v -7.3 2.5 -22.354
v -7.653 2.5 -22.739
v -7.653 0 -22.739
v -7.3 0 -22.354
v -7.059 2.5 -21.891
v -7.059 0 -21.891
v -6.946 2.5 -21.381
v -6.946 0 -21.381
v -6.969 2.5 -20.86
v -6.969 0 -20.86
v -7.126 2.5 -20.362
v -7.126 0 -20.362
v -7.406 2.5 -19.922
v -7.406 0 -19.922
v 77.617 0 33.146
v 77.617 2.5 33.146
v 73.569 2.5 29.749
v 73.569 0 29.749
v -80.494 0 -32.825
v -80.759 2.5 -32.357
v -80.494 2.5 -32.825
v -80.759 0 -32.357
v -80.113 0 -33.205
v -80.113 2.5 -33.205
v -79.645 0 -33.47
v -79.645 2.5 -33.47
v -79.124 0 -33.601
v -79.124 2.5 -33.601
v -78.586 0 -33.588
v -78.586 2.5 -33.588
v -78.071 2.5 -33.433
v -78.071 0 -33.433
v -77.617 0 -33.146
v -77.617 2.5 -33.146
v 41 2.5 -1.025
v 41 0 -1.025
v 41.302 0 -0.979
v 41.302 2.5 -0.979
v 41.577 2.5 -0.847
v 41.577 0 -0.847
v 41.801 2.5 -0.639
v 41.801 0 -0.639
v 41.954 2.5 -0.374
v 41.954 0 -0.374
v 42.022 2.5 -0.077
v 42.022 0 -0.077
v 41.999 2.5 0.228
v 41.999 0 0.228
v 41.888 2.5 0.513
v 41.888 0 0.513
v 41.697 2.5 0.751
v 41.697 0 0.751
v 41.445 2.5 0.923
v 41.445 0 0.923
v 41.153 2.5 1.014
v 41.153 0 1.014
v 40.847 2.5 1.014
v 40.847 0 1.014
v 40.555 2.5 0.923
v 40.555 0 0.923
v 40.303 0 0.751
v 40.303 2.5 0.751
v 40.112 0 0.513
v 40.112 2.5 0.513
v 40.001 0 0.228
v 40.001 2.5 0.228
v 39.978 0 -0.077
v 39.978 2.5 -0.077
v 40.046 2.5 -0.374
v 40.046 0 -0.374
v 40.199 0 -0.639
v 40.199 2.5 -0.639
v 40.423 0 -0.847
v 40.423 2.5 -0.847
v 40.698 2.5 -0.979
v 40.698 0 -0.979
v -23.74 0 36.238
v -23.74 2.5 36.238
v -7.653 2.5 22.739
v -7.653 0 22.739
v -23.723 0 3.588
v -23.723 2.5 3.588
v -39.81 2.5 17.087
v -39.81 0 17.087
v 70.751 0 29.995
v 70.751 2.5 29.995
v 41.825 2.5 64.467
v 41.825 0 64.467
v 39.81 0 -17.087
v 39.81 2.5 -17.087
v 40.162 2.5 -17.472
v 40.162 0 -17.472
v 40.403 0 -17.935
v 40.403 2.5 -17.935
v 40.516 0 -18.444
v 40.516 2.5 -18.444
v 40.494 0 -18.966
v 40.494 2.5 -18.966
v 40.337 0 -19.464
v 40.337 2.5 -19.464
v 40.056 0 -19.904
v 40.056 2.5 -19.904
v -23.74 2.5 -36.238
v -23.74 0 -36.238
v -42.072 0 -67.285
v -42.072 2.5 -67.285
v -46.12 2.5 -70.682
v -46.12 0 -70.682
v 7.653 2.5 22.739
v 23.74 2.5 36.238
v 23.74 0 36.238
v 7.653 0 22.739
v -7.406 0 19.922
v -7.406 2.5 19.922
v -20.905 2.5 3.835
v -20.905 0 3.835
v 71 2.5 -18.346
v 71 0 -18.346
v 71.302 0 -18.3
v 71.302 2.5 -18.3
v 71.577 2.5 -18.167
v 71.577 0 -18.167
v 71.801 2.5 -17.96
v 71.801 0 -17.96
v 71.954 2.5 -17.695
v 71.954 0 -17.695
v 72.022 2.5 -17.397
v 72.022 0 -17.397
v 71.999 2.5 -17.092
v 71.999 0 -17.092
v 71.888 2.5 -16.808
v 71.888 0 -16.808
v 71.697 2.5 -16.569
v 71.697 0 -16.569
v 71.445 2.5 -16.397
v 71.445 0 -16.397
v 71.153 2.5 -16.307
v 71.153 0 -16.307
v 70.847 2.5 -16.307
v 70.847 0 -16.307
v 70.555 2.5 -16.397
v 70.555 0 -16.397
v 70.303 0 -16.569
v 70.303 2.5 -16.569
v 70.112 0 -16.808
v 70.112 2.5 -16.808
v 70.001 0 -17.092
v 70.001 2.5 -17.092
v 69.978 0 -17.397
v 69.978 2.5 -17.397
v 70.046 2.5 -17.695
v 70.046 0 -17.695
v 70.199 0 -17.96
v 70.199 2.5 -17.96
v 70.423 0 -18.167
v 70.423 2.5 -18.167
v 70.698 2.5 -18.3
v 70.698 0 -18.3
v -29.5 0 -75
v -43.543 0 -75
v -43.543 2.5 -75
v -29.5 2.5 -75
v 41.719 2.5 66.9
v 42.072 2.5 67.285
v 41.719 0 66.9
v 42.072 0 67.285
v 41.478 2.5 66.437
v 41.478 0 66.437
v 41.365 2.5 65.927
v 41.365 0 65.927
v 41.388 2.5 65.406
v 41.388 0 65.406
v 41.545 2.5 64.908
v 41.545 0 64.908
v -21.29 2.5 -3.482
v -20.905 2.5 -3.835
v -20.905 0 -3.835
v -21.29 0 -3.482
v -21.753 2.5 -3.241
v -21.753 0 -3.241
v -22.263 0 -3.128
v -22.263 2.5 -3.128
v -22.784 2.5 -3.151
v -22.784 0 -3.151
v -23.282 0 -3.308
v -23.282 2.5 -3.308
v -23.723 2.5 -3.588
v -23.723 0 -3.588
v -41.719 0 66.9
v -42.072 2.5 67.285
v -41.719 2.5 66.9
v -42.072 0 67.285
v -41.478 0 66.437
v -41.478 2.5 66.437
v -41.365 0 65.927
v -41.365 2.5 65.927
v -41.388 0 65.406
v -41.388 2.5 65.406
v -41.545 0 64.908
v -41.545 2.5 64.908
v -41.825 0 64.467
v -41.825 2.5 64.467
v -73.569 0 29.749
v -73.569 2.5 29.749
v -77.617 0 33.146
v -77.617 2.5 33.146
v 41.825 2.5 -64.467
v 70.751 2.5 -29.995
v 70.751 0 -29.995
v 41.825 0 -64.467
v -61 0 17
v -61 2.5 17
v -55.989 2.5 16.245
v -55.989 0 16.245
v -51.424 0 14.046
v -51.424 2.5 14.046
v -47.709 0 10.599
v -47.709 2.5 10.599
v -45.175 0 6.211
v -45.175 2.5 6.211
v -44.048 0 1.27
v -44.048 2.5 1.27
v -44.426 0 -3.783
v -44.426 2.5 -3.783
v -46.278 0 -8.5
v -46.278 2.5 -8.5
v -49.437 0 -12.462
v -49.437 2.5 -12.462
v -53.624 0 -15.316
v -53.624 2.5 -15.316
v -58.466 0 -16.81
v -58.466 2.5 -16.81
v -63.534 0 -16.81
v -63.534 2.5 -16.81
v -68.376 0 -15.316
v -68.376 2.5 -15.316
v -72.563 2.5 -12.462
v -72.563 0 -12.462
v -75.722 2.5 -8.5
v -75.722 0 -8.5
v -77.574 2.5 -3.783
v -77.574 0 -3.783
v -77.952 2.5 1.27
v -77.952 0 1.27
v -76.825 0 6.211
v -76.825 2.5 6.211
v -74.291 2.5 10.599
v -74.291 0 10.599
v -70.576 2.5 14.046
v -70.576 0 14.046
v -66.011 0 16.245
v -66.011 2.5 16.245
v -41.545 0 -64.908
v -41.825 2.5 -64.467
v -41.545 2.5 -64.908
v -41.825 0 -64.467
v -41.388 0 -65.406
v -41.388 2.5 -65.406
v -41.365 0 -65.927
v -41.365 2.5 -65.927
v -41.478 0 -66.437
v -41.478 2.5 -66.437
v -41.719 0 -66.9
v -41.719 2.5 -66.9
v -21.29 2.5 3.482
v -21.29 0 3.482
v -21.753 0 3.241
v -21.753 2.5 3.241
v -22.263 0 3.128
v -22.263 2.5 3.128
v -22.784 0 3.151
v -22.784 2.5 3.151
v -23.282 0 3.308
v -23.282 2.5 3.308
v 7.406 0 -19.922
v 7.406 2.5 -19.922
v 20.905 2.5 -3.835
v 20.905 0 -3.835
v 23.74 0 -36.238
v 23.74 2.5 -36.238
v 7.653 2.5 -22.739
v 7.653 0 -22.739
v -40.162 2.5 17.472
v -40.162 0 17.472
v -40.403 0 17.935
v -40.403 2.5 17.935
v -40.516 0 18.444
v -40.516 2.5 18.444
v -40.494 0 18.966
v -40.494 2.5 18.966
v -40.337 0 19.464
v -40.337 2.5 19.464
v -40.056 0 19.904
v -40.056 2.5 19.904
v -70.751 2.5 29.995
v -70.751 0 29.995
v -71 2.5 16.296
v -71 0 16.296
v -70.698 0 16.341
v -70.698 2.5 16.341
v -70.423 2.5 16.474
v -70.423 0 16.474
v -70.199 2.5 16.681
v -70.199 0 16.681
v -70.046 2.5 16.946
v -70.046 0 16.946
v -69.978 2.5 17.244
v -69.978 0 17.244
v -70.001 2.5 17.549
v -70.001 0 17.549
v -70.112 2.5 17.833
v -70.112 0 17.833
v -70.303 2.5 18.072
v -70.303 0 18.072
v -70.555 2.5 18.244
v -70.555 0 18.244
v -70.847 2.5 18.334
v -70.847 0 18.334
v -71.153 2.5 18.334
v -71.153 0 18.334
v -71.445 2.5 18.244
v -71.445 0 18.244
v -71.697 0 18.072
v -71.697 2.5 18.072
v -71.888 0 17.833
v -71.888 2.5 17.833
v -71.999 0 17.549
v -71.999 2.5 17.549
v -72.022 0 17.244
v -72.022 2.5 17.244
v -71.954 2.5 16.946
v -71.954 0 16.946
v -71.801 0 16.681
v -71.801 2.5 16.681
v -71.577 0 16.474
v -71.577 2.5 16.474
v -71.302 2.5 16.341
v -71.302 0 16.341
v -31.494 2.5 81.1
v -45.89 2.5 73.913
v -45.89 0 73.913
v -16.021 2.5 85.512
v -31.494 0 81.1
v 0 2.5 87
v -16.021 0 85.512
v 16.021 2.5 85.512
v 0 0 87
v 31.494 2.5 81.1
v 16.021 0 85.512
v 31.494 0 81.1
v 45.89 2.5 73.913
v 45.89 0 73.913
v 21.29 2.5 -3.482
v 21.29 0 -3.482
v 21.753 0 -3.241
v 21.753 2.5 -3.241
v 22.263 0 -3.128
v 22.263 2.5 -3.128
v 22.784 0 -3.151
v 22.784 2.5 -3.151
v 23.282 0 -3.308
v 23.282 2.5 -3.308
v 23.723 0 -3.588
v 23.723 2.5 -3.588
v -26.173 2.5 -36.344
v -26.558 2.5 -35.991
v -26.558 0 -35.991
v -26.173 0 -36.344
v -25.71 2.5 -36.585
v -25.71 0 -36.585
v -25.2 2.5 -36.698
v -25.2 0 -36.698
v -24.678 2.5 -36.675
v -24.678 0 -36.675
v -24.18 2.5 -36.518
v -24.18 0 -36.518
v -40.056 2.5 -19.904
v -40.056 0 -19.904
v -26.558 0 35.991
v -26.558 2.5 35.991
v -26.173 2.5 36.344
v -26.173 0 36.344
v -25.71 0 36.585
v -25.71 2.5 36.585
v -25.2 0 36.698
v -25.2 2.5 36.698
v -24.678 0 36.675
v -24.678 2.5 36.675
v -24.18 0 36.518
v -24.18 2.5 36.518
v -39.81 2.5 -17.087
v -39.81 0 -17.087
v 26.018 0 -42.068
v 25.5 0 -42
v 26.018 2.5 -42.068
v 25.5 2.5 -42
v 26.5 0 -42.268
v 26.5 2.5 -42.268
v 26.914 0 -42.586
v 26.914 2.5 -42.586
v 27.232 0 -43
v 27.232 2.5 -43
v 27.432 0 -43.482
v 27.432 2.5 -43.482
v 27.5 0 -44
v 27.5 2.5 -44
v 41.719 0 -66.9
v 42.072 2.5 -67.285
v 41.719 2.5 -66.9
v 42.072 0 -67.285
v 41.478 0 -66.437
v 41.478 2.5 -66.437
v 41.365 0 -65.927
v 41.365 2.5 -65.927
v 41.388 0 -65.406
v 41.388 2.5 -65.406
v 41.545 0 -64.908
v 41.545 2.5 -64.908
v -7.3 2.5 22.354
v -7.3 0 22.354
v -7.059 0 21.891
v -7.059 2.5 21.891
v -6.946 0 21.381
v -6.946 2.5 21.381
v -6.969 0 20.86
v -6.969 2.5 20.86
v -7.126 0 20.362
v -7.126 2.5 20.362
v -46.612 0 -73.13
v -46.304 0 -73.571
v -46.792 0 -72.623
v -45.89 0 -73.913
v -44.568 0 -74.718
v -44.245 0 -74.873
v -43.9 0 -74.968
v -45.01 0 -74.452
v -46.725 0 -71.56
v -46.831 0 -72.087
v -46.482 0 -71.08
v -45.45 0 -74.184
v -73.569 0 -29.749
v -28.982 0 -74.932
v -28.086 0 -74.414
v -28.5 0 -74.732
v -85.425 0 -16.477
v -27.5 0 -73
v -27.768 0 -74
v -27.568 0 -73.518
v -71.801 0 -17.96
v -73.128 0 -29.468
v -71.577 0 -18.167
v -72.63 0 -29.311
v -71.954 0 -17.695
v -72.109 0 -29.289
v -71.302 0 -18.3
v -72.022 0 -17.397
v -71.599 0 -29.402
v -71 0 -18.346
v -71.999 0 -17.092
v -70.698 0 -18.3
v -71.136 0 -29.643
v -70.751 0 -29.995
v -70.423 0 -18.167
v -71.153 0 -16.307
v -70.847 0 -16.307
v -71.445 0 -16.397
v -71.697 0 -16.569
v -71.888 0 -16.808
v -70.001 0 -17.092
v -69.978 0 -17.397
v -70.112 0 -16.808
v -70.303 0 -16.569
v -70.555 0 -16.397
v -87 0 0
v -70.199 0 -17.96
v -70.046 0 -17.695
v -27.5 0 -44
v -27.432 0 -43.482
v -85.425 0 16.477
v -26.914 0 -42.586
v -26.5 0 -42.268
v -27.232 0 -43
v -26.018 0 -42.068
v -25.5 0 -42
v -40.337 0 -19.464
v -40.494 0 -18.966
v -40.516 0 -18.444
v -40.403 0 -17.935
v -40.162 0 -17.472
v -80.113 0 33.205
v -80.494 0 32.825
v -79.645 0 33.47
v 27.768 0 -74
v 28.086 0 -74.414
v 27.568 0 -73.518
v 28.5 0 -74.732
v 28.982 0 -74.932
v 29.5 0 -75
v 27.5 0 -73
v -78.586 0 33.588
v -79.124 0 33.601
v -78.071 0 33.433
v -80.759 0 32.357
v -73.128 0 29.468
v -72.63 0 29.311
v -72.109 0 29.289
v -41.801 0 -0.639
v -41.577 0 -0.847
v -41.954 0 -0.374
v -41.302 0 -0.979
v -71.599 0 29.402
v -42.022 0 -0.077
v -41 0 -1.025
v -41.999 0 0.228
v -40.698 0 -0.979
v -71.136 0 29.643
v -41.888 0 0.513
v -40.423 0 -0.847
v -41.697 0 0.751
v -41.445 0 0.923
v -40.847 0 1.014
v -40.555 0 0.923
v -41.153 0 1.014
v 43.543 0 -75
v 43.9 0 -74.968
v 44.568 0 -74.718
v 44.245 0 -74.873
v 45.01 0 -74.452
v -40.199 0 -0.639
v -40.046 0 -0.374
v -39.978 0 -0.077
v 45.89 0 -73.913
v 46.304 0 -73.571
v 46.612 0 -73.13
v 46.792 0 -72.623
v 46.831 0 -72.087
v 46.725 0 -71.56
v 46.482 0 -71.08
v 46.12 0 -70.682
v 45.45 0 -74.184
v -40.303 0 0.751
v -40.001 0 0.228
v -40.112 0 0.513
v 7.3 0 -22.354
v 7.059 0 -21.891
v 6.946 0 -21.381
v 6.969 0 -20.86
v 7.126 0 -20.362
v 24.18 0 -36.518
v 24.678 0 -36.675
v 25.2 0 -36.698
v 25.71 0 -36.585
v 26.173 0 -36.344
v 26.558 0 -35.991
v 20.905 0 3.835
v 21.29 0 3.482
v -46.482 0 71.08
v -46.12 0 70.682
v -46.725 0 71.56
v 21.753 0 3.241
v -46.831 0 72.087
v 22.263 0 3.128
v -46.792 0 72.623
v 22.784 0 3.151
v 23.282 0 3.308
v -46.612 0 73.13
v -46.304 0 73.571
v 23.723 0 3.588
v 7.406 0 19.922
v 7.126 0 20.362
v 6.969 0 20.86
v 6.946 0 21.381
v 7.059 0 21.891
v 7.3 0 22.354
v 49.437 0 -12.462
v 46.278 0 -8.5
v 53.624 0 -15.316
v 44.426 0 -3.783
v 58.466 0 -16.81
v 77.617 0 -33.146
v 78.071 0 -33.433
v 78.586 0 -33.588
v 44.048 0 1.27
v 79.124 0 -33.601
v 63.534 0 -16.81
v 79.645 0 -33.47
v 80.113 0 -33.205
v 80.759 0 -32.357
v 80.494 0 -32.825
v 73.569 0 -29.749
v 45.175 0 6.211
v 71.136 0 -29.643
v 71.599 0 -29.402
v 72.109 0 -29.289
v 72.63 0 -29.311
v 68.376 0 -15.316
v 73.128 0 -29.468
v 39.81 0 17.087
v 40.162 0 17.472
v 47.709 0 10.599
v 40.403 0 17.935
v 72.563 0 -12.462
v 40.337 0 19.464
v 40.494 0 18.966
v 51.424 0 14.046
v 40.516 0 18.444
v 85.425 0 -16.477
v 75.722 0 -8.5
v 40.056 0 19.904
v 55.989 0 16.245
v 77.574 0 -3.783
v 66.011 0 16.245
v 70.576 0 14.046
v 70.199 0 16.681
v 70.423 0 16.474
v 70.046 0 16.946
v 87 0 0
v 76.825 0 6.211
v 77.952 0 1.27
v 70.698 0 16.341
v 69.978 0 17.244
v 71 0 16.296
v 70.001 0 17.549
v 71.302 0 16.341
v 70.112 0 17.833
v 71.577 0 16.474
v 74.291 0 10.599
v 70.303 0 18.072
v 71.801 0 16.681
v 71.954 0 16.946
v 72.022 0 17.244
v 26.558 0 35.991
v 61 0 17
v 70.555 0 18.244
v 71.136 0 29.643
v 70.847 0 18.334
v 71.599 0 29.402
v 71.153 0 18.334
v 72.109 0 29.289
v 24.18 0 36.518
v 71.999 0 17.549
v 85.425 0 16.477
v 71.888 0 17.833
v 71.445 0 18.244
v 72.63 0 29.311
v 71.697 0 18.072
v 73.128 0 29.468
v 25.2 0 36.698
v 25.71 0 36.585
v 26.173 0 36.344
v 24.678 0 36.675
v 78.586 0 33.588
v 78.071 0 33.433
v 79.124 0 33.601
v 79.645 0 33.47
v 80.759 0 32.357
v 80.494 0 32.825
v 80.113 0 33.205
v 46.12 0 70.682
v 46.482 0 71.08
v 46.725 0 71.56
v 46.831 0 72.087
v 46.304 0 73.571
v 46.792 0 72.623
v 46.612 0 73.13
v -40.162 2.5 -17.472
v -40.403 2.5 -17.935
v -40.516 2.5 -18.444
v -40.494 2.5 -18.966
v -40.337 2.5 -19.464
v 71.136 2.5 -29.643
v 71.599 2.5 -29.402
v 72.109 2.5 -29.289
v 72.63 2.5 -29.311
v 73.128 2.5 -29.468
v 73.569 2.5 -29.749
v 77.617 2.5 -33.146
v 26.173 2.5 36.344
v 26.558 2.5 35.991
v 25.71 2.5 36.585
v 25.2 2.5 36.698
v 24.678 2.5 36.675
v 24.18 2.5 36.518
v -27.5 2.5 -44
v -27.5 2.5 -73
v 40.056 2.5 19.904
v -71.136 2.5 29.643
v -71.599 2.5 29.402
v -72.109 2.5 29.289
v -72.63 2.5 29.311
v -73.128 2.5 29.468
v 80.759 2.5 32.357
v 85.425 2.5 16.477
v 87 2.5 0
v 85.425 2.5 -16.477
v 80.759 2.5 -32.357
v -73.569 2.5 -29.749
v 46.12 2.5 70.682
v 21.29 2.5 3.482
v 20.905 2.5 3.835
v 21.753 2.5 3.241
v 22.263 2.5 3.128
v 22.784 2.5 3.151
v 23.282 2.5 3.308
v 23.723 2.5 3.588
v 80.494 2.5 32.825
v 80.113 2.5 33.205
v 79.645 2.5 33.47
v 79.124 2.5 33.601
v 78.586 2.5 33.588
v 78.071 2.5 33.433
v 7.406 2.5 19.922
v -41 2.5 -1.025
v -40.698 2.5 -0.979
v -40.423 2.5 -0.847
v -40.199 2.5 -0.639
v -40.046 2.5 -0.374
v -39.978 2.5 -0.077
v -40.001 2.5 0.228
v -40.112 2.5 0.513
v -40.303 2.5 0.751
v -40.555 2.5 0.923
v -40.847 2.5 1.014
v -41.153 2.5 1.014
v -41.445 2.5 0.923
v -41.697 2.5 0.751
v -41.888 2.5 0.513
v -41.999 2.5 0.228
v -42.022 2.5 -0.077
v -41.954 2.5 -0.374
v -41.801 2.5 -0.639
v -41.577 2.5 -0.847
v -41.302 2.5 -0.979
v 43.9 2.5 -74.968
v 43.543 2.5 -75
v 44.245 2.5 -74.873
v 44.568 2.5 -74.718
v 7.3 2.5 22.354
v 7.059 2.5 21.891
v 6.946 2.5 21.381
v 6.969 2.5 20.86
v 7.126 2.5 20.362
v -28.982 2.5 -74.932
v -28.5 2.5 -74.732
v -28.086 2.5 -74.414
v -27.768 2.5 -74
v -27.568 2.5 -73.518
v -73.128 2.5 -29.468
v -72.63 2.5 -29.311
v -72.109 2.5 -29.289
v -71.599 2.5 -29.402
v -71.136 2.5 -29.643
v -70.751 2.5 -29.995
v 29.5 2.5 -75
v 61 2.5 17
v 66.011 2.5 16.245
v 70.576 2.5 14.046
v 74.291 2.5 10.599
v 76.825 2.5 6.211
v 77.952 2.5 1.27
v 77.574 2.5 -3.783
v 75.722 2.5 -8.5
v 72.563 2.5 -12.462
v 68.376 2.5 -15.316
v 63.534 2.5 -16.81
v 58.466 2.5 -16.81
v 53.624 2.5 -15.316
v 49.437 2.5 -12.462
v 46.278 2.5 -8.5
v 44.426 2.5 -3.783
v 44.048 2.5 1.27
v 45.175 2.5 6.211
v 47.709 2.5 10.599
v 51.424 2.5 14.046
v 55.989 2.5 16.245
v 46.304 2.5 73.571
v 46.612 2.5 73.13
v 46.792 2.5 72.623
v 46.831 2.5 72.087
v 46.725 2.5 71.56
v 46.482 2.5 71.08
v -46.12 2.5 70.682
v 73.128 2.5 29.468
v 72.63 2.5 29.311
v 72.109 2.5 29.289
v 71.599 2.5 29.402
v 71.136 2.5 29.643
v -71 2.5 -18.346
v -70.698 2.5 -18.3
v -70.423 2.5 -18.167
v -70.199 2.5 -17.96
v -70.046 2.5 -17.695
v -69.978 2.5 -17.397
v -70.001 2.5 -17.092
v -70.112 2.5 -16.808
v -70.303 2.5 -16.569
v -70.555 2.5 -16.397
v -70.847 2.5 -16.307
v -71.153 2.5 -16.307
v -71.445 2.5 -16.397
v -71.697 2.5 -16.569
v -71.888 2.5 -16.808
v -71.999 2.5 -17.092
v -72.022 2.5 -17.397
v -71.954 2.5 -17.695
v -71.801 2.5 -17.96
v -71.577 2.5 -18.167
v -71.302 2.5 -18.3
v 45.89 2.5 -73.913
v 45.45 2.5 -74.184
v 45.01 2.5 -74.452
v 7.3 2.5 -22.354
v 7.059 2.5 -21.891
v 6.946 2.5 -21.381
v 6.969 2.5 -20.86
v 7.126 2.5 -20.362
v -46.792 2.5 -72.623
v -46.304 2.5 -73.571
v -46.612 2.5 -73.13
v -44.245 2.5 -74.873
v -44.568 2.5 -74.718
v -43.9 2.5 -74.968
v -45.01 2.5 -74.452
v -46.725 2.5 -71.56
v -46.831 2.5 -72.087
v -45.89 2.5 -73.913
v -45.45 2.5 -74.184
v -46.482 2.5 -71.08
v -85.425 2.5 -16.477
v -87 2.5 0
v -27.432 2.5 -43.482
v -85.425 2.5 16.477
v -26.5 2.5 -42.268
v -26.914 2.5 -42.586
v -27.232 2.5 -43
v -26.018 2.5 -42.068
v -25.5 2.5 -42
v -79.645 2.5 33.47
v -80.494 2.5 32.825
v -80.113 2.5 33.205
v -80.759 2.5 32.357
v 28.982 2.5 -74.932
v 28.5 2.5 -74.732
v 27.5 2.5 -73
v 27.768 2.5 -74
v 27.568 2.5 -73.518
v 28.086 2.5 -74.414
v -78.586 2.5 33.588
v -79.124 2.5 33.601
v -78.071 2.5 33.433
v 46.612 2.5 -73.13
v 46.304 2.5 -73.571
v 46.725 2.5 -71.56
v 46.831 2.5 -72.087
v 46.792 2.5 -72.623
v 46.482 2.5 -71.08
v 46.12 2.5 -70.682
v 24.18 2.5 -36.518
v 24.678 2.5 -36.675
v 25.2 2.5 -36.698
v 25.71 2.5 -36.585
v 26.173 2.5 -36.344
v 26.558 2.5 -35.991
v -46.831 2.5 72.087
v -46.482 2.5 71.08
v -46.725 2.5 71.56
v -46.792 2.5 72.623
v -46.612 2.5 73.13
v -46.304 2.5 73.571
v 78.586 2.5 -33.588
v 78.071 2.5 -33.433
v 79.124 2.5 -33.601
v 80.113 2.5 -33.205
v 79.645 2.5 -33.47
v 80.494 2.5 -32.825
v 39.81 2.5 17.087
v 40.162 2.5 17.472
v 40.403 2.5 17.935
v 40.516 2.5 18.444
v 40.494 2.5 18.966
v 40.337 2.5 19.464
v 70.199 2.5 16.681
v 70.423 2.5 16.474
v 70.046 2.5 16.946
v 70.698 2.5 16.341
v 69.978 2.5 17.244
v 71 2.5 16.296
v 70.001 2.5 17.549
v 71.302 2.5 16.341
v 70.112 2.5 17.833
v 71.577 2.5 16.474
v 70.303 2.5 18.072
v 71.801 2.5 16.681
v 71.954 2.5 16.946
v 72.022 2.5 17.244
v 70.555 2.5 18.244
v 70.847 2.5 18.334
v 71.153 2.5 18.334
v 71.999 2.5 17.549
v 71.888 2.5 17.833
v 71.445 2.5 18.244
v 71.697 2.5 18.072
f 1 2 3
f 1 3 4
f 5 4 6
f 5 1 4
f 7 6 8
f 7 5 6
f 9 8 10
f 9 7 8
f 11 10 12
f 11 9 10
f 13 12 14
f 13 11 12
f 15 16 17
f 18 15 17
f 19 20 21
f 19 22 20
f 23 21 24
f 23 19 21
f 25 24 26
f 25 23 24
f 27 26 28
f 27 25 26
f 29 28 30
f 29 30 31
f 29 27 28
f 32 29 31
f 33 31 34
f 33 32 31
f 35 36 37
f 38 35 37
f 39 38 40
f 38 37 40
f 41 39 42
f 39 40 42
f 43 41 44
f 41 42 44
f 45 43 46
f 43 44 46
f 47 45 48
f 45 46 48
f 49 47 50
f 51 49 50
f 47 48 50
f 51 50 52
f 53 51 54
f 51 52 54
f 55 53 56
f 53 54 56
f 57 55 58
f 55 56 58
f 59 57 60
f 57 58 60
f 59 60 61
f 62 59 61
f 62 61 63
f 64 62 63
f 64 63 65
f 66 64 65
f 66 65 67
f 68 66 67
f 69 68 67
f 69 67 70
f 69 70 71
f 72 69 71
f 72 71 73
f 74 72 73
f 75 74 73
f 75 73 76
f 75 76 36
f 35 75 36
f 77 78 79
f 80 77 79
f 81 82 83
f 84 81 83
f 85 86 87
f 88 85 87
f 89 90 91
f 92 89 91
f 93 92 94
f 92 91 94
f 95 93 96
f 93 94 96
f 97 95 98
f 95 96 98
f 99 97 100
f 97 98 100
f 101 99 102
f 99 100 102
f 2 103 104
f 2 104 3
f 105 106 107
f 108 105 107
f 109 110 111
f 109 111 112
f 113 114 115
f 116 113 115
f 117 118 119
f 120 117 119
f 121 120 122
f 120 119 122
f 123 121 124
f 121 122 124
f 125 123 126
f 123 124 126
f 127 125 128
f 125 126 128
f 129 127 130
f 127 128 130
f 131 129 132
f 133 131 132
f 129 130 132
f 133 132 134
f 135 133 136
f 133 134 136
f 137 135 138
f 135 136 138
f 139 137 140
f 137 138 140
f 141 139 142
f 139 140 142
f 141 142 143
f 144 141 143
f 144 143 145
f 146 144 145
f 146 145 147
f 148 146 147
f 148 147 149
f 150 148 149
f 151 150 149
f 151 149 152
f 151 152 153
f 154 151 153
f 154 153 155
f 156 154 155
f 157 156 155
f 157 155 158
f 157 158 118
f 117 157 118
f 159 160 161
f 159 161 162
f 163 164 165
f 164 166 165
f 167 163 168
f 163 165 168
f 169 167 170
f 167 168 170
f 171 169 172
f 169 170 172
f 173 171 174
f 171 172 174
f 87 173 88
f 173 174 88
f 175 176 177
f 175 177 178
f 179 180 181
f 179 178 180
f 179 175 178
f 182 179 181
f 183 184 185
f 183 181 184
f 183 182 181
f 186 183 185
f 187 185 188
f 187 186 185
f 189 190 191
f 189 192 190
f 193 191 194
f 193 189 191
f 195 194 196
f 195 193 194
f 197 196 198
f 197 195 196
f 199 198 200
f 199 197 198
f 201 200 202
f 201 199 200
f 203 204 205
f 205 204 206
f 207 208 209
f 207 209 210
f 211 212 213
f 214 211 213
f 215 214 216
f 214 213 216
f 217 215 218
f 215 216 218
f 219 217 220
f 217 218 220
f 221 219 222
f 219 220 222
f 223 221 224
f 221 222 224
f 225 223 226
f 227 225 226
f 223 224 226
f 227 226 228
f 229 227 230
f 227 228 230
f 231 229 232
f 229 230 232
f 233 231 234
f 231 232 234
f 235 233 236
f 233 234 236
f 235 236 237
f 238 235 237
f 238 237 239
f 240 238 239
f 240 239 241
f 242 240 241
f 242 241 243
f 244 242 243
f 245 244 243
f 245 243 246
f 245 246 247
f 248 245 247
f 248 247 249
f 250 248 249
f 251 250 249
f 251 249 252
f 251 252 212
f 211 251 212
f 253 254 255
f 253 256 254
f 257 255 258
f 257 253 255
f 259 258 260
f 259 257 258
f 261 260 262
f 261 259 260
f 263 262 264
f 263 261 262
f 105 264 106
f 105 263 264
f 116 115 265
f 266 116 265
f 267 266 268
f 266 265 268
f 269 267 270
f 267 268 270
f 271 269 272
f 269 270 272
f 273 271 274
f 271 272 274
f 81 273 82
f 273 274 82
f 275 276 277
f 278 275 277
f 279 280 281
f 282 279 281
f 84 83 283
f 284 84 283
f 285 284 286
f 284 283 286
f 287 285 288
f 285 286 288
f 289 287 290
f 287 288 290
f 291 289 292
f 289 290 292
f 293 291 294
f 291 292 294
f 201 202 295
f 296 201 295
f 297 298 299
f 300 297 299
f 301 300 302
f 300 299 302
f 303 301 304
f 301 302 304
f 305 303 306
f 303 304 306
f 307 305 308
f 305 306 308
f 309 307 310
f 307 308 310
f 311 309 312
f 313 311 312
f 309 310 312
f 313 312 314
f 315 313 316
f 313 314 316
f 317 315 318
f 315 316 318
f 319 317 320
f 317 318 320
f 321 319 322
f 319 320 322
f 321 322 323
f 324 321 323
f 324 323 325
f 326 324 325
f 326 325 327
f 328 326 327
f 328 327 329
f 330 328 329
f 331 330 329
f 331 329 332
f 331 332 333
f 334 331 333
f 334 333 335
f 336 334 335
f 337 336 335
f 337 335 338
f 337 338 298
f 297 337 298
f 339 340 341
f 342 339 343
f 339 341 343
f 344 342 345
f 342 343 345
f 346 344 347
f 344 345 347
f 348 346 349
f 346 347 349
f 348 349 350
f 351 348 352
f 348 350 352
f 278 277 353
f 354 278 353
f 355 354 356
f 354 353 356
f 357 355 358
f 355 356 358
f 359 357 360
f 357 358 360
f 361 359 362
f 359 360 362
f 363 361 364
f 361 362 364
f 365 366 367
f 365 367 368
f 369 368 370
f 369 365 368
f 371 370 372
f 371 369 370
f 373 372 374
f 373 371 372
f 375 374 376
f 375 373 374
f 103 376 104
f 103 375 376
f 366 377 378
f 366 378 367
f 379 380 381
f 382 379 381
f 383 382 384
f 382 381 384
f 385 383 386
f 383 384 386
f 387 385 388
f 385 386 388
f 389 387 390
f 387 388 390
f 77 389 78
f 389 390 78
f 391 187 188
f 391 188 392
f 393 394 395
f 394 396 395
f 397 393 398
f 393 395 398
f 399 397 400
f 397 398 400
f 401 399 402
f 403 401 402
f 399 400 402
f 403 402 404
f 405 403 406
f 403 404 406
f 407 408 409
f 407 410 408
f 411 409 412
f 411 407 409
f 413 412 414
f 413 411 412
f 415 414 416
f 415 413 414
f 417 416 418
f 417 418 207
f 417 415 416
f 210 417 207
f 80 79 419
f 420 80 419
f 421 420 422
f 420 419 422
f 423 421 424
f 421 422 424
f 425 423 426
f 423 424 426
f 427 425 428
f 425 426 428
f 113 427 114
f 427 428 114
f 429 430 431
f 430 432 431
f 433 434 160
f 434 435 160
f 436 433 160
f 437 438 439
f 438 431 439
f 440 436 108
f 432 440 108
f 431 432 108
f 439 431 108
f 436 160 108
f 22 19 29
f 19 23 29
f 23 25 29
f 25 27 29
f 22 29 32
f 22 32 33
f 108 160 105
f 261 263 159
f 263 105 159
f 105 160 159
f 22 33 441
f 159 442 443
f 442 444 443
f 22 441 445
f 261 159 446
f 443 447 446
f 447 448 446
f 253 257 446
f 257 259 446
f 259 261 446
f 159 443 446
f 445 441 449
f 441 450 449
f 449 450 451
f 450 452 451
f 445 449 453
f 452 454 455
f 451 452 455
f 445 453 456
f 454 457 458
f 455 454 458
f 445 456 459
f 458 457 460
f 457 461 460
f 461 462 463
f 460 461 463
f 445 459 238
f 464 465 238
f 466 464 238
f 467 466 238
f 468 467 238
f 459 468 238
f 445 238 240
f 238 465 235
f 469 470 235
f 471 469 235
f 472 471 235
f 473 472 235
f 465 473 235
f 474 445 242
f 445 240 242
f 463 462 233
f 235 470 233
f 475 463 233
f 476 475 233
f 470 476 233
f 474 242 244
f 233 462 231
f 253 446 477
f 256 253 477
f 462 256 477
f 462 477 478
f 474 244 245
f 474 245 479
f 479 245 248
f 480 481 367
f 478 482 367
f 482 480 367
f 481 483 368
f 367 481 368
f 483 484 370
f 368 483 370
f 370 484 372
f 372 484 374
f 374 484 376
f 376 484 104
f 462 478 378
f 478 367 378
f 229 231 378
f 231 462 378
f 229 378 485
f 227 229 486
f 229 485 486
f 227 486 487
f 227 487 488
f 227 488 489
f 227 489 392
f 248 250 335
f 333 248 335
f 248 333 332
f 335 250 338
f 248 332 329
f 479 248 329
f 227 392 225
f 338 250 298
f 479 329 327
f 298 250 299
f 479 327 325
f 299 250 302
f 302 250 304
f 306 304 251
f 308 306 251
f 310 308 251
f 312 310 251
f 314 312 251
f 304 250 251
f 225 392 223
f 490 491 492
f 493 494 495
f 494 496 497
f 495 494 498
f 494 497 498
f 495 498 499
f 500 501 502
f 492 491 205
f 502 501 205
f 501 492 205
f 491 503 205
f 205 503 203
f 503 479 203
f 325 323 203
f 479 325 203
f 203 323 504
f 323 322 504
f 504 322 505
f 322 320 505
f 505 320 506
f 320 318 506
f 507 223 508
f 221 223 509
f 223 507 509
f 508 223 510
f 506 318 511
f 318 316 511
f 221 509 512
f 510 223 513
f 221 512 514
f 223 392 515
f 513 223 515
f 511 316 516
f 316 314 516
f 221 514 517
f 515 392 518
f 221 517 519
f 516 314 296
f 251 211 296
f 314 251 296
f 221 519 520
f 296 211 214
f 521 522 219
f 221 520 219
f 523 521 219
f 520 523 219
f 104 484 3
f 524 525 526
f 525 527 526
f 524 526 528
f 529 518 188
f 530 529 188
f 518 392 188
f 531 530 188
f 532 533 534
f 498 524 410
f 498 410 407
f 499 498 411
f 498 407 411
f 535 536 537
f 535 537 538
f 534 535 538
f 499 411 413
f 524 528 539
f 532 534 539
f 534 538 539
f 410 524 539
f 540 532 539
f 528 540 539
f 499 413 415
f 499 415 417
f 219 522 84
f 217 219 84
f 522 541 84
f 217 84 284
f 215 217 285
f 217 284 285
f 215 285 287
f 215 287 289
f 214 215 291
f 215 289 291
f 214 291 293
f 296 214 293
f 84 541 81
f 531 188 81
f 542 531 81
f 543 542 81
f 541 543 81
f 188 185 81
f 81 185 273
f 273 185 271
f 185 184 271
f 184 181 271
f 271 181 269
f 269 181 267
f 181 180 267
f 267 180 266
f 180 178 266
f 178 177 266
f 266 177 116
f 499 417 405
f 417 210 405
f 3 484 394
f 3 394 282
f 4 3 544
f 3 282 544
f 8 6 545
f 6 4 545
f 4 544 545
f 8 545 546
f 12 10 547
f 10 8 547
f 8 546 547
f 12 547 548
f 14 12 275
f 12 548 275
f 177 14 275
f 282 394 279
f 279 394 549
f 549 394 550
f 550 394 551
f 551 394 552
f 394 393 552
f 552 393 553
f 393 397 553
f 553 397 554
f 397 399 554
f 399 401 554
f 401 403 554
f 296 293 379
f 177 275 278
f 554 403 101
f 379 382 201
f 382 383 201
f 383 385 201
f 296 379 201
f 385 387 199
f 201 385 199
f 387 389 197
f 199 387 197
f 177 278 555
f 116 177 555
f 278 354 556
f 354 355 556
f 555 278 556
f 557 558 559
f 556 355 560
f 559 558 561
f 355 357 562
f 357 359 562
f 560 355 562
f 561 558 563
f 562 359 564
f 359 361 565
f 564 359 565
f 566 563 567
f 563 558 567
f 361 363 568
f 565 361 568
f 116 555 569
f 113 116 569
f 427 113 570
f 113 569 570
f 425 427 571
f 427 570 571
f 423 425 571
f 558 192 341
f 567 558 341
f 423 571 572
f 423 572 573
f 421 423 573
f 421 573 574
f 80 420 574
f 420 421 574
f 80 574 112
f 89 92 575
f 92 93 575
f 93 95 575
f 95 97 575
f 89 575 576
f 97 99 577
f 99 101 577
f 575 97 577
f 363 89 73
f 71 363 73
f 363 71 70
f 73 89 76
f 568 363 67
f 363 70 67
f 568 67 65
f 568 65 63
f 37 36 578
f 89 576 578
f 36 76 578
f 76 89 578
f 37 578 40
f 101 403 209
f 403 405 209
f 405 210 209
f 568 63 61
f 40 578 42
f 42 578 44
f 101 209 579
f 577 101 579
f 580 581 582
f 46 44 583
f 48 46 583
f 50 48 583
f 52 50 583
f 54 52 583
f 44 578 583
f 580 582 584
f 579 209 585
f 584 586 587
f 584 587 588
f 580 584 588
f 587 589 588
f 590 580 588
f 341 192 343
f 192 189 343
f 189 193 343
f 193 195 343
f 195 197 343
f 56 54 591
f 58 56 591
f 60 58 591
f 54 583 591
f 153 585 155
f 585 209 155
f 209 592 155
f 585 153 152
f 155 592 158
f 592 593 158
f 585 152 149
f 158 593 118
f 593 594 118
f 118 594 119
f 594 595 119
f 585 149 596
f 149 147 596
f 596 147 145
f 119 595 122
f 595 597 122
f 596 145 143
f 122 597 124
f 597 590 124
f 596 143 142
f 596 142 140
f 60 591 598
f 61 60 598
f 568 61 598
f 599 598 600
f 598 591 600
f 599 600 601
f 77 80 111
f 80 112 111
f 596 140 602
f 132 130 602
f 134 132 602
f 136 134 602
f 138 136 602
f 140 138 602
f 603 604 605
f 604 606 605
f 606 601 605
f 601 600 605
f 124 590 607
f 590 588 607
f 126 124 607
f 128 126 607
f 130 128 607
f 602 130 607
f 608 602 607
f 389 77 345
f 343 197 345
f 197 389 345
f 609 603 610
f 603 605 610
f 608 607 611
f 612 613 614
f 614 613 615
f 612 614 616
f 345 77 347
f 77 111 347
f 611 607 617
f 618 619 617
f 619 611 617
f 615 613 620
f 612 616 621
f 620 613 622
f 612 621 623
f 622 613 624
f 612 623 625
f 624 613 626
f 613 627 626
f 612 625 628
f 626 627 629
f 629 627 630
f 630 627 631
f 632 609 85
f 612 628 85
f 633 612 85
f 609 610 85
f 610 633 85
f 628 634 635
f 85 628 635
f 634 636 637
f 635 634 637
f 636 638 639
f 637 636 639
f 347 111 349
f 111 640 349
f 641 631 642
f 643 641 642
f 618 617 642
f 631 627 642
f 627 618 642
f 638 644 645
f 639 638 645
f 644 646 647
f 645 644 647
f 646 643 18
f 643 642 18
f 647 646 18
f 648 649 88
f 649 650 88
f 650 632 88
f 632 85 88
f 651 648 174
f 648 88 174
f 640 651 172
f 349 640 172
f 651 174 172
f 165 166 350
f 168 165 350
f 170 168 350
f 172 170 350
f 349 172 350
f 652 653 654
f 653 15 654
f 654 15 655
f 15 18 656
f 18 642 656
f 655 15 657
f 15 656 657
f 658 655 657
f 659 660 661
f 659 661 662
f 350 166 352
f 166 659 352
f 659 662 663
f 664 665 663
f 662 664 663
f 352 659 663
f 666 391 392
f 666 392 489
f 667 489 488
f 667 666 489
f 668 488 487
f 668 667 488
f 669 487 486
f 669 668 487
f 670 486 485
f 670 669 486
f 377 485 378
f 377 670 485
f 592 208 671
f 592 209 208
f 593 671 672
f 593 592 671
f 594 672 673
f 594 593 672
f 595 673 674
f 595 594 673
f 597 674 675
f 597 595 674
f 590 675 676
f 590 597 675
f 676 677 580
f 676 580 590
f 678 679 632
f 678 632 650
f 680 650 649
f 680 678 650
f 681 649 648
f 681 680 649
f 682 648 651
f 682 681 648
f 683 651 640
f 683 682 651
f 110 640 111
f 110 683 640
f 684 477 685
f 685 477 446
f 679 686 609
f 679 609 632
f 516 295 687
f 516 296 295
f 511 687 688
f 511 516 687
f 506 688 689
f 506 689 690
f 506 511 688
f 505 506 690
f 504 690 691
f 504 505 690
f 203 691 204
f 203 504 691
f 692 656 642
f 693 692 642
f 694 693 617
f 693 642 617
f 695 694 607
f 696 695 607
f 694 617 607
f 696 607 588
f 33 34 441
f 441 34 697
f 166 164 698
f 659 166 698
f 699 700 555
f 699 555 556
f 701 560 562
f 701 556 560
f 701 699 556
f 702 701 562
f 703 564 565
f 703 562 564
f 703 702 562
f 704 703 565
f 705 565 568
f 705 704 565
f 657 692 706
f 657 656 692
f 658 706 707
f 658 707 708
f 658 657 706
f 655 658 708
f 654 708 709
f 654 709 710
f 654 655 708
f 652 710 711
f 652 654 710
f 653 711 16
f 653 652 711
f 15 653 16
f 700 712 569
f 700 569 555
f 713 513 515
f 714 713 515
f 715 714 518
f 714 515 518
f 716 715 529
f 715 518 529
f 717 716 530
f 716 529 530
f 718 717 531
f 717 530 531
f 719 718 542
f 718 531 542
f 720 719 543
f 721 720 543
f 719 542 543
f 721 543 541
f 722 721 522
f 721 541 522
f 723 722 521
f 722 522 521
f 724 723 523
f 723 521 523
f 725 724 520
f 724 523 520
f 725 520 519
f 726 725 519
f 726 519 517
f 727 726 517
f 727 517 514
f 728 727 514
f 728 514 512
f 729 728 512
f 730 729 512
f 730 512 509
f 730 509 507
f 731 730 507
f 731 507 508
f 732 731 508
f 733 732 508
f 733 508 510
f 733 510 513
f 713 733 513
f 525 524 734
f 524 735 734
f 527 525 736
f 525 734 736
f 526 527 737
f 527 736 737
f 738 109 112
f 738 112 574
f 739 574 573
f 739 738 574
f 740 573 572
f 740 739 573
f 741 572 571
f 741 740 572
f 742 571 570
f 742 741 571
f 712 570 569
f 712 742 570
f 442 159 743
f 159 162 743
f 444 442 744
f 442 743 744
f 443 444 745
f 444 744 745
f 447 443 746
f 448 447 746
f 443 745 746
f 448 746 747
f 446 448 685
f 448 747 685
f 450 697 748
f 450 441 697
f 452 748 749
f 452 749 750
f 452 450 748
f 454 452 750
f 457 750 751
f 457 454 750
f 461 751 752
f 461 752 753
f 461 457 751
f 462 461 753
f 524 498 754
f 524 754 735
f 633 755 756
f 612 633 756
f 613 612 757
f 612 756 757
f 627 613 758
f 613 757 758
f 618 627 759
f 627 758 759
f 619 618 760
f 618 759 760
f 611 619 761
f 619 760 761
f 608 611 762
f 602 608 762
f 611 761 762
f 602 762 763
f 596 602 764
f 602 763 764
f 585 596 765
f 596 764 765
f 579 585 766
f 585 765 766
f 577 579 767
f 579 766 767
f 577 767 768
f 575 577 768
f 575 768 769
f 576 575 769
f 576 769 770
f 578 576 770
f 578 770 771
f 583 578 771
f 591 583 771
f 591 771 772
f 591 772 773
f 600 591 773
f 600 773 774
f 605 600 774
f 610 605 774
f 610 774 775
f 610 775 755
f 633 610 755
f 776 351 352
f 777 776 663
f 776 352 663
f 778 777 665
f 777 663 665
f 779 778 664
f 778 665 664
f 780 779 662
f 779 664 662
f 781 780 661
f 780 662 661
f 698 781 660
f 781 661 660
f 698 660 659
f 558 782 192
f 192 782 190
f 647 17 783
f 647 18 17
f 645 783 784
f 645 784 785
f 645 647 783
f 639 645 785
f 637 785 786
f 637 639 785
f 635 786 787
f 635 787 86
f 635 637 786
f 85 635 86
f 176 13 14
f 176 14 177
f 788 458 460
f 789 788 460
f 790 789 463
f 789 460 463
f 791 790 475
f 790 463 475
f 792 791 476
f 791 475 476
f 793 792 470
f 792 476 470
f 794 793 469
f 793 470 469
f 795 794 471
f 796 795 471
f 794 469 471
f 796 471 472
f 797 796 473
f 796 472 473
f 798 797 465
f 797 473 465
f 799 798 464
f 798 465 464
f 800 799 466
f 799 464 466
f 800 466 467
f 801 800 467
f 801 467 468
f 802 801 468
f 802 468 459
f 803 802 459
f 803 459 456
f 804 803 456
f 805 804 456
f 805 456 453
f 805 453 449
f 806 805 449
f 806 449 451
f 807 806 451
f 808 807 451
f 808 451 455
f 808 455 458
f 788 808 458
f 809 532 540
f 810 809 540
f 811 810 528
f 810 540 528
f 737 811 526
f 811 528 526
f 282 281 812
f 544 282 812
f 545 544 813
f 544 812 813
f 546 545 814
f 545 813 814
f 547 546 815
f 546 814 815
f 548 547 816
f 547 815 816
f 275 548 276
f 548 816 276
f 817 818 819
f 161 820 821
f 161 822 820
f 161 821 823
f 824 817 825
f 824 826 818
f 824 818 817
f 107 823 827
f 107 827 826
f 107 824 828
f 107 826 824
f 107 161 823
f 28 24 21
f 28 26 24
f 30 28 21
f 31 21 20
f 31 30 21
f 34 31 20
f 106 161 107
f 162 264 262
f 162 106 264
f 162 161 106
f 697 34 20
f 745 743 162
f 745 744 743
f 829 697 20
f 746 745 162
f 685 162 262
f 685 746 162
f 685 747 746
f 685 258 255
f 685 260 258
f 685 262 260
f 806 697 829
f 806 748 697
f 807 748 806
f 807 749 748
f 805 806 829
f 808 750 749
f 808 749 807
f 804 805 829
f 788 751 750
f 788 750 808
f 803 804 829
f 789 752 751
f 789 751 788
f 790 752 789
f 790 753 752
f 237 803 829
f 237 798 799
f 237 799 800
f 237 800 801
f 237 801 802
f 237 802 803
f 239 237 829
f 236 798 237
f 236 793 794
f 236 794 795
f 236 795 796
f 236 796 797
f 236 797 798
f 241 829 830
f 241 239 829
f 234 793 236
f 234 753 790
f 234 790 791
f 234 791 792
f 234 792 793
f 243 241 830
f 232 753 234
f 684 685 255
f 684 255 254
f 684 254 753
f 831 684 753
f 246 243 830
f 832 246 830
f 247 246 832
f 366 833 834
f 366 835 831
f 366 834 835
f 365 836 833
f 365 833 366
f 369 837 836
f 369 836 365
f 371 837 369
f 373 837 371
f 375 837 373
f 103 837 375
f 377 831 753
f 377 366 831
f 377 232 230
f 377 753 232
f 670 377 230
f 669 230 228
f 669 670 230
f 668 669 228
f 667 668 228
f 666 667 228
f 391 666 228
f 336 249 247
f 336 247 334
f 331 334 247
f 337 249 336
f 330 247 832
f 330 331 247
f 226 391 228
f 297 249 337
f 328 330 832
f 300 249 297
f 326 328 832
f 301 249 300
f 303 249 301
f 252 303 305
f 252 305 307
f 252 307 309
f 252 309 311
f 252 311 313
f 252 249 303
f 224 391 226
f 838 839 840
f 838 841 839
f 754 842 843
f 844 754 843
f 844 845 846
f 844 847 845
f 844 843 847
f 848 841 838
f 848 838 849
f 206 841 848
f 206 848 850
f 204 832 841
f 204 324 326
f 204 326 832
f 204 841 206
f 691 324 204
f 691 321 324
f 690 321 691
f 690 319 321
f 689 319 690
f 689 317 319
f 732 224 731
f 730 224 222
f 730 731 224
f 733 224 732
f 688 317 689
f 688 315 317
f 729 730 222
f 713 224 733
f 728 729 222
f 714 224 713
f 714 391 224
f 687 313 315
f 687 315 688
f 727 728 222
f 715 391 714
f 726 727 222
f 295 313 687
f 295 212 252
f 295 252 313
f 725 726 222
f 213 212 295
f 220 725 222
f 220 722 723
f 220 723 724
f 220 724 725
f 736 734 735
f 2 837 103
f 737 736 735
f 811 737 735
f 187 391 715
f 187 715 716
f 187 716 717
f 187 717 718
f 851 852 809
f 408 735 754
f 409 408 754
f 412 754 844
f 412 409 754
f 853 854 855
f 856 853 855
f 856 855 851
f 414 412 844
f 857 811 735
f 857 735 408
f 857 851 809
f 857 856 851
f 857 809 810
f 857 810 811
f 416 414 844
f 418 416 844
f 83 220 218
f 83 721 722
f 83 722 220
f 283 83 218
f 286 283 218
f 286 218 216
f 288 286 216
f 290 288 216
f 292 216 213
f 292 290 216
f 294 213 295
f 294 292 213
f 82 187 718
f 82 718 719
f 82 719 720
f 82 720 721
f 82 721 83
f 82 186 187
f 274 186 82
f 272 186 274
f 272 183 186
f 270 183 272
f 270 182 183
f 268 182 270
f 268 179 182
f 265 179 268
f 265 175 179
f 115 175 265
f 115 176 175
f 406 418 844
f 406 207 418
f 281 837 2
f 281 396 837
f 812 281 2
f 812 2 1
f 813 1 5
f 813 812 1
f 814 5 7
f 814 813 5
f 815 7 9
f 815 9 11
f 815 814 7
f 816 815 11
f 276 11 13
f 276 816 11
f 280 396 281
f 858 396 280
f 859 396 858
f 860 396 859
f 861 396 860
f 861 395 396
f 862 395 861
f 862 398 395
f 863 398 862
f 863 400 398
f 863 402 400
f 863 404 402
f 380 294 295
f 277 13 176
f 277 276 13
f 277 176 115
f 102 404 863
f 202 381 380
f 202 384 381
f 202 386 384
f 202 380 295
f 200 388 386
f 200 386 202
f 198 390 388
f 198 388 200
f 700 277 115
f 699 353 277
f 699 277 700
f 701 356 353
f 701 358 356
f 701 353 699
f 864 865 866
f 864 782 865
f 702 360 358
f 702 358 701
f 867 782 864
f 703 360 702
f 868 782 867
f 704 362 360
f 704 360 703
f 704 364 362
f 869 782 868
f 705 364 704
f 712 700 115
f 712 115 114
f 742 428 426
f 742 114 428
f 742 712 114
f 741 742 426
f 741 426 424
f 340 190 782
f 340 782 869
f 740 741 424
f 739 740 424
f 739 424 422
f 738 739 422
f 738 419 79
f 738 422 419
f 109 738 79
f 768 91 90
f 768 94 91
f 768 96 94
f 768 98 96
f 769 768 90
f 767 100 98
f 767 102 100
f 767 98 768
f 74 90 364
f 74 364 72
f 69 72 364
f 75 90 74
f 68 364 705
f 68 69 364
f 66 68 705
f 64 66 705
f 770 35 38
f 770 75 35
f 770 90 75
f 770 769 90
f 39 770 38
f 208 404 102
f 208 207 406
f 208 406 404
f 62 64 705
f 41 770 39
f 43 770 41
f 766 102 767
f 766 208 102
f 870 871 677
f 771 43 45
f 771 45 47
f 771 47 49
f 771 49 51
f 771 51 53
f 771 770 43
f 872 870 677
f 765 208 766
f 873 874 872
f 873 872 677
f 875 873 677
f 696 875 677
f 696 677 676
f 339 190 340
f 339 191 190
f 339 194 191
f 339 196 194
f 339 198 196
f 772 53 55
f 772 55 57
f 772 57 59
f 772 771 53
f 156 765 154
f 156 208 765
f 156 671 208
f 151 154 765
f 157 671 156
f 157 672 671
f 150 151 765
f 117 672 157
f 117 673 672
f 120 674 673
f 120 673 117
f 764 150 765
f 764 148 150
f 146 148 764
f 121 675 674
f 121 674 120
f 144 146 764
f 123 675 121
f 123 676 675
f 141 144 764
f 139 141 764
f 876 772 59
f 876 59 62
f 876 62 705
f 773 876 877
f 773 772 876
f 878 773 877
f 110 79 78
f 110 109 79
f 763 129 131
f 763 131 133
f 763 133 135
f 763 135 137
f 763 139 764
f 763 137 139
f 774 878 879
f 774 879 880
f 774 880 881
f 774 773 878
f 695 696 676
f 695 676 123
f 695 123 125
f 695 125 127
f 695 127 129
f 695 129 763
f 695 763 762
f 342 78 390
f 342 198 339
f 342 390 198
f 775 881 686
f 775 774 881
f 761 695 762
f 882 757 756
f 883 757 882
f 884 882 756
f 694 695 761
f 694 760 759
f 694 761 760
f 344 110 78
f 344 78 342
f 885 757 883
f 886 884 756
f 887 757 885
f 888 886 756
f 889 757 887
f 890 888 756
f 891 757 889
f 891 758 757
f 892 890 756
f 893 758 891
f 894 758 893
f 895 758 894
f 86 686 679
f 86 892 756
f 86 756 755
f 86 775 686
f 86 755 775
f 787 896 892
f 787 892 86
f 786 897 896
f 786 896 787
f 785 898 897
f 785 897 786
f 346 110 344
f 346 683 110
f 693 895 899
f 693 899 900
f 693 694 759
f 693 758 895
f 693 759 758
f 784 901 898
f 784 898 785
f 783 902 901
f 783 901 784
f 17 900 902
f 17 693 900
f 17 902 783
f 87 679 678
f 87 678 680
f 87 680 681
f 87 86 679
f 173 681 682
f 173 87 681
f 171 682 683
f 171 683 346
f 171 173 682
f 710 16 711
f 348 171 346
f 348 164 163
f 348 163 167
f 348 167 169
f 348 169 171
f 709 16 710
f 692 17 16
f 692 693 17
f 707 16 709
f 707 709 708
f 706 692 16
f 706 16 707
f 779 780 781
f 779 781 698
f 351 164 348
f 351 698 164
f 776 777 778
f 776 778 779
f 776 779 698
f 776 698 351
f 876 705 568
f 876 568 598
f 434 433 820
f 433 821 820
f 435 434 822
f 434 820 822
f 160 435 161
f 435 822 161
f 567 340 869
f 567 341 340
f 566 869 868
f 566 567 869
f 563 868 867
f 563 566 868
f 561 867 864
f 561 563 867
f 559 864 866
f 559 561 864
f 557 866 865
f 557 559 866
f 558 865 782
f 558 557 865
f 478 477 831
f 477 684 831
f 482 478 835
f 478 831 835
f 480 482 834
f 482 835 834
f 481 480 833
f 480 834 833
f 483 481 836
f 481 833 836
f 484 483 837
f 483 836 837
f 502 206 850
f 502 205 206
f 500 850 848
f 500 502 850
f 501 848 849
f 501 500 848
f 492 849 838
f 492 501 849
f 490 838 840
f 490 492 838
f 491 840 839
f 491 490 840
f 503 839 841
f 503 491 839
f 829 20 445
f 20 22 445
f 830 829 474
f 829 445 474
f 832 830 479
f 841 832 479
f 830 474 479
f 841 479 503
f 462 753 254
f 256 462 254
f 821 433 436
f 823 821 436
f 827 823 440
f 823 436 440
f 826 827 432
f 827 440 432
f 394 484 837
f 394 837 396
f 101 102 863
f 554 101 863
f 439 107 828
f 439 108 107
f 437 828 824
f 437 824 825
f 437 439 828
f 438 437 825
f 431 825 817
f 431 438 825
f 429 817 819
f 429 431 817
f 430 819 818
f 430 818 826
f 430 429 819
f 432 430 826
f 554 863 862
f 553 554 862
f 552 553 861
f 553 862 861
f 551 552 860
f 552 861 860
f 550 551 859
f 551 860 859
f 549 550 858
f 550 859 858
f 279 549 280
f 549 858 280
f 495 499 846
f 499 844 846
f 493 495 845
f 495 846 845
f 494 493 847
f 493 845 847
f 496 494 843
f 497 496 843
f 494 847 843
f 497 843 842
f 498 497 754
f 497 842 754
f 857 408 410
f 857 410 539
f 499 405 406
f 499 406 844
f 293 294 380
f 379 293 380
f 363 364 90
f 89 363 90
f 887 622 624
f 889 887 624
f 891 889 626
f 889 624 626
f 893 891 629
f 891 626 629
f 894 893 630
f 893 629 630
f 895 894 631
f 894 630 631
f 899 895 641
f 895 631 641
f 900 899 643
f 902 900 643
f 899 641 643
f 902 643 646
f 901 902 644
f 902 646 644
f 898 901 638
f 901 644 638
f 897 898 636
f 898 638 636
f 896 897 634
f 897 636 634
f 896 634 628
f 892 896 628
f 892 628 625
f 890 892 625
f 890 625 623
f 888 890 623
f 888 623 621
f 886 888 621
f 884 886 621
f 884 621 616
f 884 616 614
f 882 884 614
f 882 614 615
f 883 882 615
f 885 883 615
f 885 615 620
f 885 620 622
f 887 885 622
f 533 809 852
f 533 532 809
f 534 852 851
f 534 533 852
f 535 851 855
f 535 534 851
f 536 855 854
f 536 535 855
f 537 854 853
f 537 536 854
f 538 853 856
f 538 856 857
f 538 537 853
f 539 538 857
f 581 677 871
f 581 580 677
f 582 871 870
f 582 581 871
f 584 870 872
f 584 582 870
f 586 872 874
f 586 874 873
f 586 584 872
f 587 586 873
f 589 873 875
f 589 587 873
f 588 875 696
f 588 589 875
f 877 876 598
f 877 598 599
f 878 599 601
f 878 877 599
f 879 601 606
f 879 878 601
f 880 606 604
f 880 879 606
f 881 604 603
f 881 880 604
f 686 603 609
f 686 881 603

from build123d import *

# Parameters (mm, degrees)
ESBO_O1_R                = 87
RESSALTO_EXTRUS_O1_DEPTH = 2.5
CORTE_EXTRUS_O1_DEPTH    = 2.5
CORTE_EXTRUS_O2_START    = -2.5
ESBO_O3_W                = 27.5
ESBO_O3_H                = 33
CORTE_EXTRUS_O2_DEPTH    = 2.5
FILETE2_R                = 2
ESBO_O4_R                = 17
CORTE_EXTRUS_O3_DEPTH    = 4
CORTE_EXTRUS_O5_DEPTH    = 3
FURO_ROSCADO_DE_M2_51_D  = 2.05


with BuildPart() as part:
    # Esboço1 → Ressalto-extrusão1 (new body)
    with BuildSketch(Plane(origin=(0, 0, 0), x_dir=(1, 0, 0), z_dir=(0, 1, 0))):
        with Locations(Location((0, 0, 0), (0, 0, 270))):
            Circle(ESBO_O1_R)
    extrude(amount=RESSALTO_EXTRUS_O1_DEPTH)

    # Esboço2 → Corte-extrusão1 (cut)
    with BuildSketch(Plane(origin=(0, 2.5, 0), x_dir=(1, 0, 0), z_dir=(0, 1, 0))):
        Polygon((66.645866551, 55.922522043), (82.394162989, 37.154433186), (79.696950599, 34.891203265), (72.036506168, 28.463327168), (40.539913293, 65.999504881), (48.200357724, 72.427380978), (50.897570114, 74.690610899), align=None)
        Polygon((50.897570114, -74.690610899), (82.394162989, -37.154433186), (79.696950599, -34.891203265), (72.036506168, -28.463327168), (40.539913293, -65.999504881), (48.200357724, -72.427380978), align=None)
        Polygon((-72.036506168, 28.463327168), (-40.539913293, 65.999504881), (-48.200357724, 72.427380978), (-50.897570114, 74.690610899), (-66.645866551, 55.922522043), (-82.394162989, 37.154433186), (-79.696950599, 34.891203265), align=None)
        Polygon((-79.696950599, -34.891203265), (-82.394162989, -37.154433186), (-50.897570114, -74.690610899), (-48.200357724, -72.427380978), (-40.539913293, -65.999504881), (-72.036506168, -28.463327168), align=None)
    extrude(amount=-CORTE_EXTRUS_O1_DEPTH, mode=Mode.SUBTRACT)

    # Esboço3 → Corte-extrusão2 (cut)
    with BuildSketch(Plane(origin=(0, 2.5, 0), x_dir=(1, 0, 0), z_dir=(0, 1, 0)).offset(CORTE_EXTRUS_O2_START)):
        with Locations((-13.75, 58.5)):
            Rectangle(ESBO_O3_W, ESBO_O3_H)
        with Locations((13.75, 58.5)):
            Rectangle(ESBO_O3_W, ESBO_O3_H)
        with BuildLine():
            Line((0, 87), (0, 75))
            Line((0, 75), (27.5, 75))
            Line((27.5, 75), (44.09081537, 75))
            ThreePointArc((44.09081537, 75), (22.847319318, 83.946411478), (0, 87))
        make_face()
        with BuildLine():
            Line((-27.5, 75), (0, 75))
            Line((0, 75), (0, 87))
            ThreePointArc((0, 87), (-22.847319318, 83.946411478), (-44.09081537, 75))
            Line((-44.09081537, 75), (-27.5, 75))
        make_face()
    extrude(amount=CORTE_EXTRUS_O2_DEPTH, mode=Mode.SUBTRACT)

    # Filete2
    filete2_edges = [part.edges().sort_by_distance(p)[0] for p in [
        (27.5, 1.25, -42),
        (-27.5, 1.25, -42),
        (-27.5, 1.25, -75),
        (-44.09081537, 1.25, -75),
        (44.09081537, 1.25, -75),
        (27.5, 1.25, -75),
        (79.696950599, 1.25, 34.891203265),
        (72.036506168, 1.25, 28.463327168),
        (48.200357724, 1.25, 72.427380978),
        (40.539913293, 1.25, 65.999504881),
        (-79.696950599, 1.25, -34.891203265),
        (-72.036506168, 1.25, -28.463327168),
        (-48.200357724, 1.25, -72.427380978),
        (-40.539913293, 1.25, -65.999504881),
        (-79.696950599, 1.25, 34.891203265),
        (-48.200357724, 1.25, 72.427380978),
        (-40.539913293, 1.25, 65.999504881),
        (-72.036506168, 1.25, 28.463327168),
        (79.696950599, 1.25, -34.891203265),
        (48.200357724, 1.25, -72.427380978),
        (40.539913293, 1.25, -65.999504881),
        (72.036506168, 1.25, -28.463327168),
    ]]
    fillet(filete2_edges, radius=FILETE2_R)

    # Esboço4 → Corte-extrusão3 (cut)
    with BuildSketch(Plane(origin=(0, 2.5, 0), x_dir=(1, 0, 0), z_dir=(0, 1, 0))):
        with Locations(Location((61, 0, 0), (0, 0, 270))):
            Circle(ESBO_O4_R)
        with Locations(Location((-61, 0, 0), (0, 0, 270))):
            Circle(ESBO_O4_R)
    extrude(amount=-CORTE_EXTRUS_O3_DEPTH, mode=Mode.SUBTRACT)

    # Esboço7 → Corte-extrusão5 (cut)
    with BuildSketch(Plane(origin=(0, 2.5, 0), x_dir=(1, 0, 0), z_dir=(0, 1, 0))):
        with BuildLine():
            Line((-40.056146338, -19.904321081), (-26.557606535, -35.991254386))
            ThreePointArc((-26.557606535, -35.991254386), (-25.199829134, -36.698068563), (-23.739942429, -36.237768053))
            Line((-23.739942429, -36.237768053), (-7.653009124, -22.73922825))
            ThreePointArc((-7.653009124, -22.73922825), (-6.946194947, -21.381450849), (-7.406495457, -19.921564144))
            Line((-7.406495457, -19.921564144), (-20.90503526, -3.834630839))
            ThreePointArc((-20.90503526, -3.834630839), (-22.262812661, -3.127816662), (-23.722699366, -3.588117172))
            Line((-23.722699366, -3.588117172), (-39.809632672, -17.086656975))
            ThreePointArc((-39.809632672, -17.086656975), (-40.516446848, -18.444434376), (-40.056146338, -19.904321081))
        make_face()
        with BuildLine():
            Line((-23.722699366, 3.588117172), (-39.809632672, 17.086656975))
            ThreePointArc((-39.809632672, 17.086656975), (-40.516446848, 18.444434376), (-40.056146338, 19.904321081))
            Line((-40.056146338, 19.904321081), (-26.557606535, 35.991254386))
            ThreePointArc((-26.557606535, 35.991254386), (-25.199829134, 36.698068563), (-23.739942429, 36.237768053))
            Line((-23.739942429, 36.237768053), (-7.653009124, 22.73922825))
            ThreePointArc((-7.653009124, 22.73922825), (-6.946194947, 21.381450849), (-7.406495457, 19.921564144))
            Line((-7.406495457, 19.921564144), (-20.90503526, 3.834630839))
            ThreePointArc((-20.90503526, 3.834630839), (-22.262812661, 3.127816662), (-23.722699366, 3.588117172))
        make_face()
        with BuildLine():
            Line((40.056146338, 19.904321081), (26.557606535, 35.991254386))
            ThreePointArc((26.557606535, 35.991254386), (25.199829134, 36.698068563), (23.739942429, 36.237768053))
            Line((23.739942429, 36.237768053), (7.653009124, 22.73922825))
            ThreePointArc((7.653009124, 22.73922825), (6.946194947, 21.381450849), (7.406495457, 19.921564144))
            Line((7.406495457, 19.921564144), (20.90503526, 3.834630839))
            ThreePointArc((20.90503526, 3.834630839), (22.262812661, 3.127816662), (23.722699366, 3.588117172))
            Line((23.722699366, 3.588117172), (39.809632672, 17.086656975))
            ThreePointArc((39.809632672, 17.086656975), (40.516446848, 18.444434376), (40.056146338, 19.904321081))
        make_face()
        with BuildLine():
            Line((23.722699366, -3.588117172), (39.809632672, -17.086656975))
            ThreePointArc((39.809632672, -17.086656975), (40.516446848, -18.444434376), (40.056146338, -19.904321081))
            Line((40.056146338, -19.904321081), (26.557606535, -35.991254386))
            ThreePointArc((26.557606535, -35.991254386), (25.199829134, -36.698068563), (23.739942429, -36.237768053))
            Line((23.739942429, -36.237768053), (7.653009124, -22.73922825))
            ThreePointArc((7.653009124, -22.73922825), (6.946194947, -21.381450849), (7.406495457, -19.921564144))
            Line((7.406495457, -19.921564144), (20.90503526, -3.834630839))
            ThreePointArc((20.90503526, -3.834630839), (22.262812661, -3.127816662), (23.722699366, -3.588117172))
        make_face()
    extrude(amount=-CORTE_EXTRUS_O5_DEPTH, mode=Mode.SUBTRACT)

    # Furo roscado de M2.51 (through all)
    with Locations(Plane(origin=(-71, 2.5, -17.320508076), x_dir=(0, 0, 1), z_dir=(0, 1, 0))):
        with Locations((0, 0), (17.320508076, 30), (34.641016152, 0), (17.320508076, 112), (0, 142), (34.641016152, 142)):
            Hole(FURO_ROSCADO_DE_M2_51_D / 2)


solid = part.part
